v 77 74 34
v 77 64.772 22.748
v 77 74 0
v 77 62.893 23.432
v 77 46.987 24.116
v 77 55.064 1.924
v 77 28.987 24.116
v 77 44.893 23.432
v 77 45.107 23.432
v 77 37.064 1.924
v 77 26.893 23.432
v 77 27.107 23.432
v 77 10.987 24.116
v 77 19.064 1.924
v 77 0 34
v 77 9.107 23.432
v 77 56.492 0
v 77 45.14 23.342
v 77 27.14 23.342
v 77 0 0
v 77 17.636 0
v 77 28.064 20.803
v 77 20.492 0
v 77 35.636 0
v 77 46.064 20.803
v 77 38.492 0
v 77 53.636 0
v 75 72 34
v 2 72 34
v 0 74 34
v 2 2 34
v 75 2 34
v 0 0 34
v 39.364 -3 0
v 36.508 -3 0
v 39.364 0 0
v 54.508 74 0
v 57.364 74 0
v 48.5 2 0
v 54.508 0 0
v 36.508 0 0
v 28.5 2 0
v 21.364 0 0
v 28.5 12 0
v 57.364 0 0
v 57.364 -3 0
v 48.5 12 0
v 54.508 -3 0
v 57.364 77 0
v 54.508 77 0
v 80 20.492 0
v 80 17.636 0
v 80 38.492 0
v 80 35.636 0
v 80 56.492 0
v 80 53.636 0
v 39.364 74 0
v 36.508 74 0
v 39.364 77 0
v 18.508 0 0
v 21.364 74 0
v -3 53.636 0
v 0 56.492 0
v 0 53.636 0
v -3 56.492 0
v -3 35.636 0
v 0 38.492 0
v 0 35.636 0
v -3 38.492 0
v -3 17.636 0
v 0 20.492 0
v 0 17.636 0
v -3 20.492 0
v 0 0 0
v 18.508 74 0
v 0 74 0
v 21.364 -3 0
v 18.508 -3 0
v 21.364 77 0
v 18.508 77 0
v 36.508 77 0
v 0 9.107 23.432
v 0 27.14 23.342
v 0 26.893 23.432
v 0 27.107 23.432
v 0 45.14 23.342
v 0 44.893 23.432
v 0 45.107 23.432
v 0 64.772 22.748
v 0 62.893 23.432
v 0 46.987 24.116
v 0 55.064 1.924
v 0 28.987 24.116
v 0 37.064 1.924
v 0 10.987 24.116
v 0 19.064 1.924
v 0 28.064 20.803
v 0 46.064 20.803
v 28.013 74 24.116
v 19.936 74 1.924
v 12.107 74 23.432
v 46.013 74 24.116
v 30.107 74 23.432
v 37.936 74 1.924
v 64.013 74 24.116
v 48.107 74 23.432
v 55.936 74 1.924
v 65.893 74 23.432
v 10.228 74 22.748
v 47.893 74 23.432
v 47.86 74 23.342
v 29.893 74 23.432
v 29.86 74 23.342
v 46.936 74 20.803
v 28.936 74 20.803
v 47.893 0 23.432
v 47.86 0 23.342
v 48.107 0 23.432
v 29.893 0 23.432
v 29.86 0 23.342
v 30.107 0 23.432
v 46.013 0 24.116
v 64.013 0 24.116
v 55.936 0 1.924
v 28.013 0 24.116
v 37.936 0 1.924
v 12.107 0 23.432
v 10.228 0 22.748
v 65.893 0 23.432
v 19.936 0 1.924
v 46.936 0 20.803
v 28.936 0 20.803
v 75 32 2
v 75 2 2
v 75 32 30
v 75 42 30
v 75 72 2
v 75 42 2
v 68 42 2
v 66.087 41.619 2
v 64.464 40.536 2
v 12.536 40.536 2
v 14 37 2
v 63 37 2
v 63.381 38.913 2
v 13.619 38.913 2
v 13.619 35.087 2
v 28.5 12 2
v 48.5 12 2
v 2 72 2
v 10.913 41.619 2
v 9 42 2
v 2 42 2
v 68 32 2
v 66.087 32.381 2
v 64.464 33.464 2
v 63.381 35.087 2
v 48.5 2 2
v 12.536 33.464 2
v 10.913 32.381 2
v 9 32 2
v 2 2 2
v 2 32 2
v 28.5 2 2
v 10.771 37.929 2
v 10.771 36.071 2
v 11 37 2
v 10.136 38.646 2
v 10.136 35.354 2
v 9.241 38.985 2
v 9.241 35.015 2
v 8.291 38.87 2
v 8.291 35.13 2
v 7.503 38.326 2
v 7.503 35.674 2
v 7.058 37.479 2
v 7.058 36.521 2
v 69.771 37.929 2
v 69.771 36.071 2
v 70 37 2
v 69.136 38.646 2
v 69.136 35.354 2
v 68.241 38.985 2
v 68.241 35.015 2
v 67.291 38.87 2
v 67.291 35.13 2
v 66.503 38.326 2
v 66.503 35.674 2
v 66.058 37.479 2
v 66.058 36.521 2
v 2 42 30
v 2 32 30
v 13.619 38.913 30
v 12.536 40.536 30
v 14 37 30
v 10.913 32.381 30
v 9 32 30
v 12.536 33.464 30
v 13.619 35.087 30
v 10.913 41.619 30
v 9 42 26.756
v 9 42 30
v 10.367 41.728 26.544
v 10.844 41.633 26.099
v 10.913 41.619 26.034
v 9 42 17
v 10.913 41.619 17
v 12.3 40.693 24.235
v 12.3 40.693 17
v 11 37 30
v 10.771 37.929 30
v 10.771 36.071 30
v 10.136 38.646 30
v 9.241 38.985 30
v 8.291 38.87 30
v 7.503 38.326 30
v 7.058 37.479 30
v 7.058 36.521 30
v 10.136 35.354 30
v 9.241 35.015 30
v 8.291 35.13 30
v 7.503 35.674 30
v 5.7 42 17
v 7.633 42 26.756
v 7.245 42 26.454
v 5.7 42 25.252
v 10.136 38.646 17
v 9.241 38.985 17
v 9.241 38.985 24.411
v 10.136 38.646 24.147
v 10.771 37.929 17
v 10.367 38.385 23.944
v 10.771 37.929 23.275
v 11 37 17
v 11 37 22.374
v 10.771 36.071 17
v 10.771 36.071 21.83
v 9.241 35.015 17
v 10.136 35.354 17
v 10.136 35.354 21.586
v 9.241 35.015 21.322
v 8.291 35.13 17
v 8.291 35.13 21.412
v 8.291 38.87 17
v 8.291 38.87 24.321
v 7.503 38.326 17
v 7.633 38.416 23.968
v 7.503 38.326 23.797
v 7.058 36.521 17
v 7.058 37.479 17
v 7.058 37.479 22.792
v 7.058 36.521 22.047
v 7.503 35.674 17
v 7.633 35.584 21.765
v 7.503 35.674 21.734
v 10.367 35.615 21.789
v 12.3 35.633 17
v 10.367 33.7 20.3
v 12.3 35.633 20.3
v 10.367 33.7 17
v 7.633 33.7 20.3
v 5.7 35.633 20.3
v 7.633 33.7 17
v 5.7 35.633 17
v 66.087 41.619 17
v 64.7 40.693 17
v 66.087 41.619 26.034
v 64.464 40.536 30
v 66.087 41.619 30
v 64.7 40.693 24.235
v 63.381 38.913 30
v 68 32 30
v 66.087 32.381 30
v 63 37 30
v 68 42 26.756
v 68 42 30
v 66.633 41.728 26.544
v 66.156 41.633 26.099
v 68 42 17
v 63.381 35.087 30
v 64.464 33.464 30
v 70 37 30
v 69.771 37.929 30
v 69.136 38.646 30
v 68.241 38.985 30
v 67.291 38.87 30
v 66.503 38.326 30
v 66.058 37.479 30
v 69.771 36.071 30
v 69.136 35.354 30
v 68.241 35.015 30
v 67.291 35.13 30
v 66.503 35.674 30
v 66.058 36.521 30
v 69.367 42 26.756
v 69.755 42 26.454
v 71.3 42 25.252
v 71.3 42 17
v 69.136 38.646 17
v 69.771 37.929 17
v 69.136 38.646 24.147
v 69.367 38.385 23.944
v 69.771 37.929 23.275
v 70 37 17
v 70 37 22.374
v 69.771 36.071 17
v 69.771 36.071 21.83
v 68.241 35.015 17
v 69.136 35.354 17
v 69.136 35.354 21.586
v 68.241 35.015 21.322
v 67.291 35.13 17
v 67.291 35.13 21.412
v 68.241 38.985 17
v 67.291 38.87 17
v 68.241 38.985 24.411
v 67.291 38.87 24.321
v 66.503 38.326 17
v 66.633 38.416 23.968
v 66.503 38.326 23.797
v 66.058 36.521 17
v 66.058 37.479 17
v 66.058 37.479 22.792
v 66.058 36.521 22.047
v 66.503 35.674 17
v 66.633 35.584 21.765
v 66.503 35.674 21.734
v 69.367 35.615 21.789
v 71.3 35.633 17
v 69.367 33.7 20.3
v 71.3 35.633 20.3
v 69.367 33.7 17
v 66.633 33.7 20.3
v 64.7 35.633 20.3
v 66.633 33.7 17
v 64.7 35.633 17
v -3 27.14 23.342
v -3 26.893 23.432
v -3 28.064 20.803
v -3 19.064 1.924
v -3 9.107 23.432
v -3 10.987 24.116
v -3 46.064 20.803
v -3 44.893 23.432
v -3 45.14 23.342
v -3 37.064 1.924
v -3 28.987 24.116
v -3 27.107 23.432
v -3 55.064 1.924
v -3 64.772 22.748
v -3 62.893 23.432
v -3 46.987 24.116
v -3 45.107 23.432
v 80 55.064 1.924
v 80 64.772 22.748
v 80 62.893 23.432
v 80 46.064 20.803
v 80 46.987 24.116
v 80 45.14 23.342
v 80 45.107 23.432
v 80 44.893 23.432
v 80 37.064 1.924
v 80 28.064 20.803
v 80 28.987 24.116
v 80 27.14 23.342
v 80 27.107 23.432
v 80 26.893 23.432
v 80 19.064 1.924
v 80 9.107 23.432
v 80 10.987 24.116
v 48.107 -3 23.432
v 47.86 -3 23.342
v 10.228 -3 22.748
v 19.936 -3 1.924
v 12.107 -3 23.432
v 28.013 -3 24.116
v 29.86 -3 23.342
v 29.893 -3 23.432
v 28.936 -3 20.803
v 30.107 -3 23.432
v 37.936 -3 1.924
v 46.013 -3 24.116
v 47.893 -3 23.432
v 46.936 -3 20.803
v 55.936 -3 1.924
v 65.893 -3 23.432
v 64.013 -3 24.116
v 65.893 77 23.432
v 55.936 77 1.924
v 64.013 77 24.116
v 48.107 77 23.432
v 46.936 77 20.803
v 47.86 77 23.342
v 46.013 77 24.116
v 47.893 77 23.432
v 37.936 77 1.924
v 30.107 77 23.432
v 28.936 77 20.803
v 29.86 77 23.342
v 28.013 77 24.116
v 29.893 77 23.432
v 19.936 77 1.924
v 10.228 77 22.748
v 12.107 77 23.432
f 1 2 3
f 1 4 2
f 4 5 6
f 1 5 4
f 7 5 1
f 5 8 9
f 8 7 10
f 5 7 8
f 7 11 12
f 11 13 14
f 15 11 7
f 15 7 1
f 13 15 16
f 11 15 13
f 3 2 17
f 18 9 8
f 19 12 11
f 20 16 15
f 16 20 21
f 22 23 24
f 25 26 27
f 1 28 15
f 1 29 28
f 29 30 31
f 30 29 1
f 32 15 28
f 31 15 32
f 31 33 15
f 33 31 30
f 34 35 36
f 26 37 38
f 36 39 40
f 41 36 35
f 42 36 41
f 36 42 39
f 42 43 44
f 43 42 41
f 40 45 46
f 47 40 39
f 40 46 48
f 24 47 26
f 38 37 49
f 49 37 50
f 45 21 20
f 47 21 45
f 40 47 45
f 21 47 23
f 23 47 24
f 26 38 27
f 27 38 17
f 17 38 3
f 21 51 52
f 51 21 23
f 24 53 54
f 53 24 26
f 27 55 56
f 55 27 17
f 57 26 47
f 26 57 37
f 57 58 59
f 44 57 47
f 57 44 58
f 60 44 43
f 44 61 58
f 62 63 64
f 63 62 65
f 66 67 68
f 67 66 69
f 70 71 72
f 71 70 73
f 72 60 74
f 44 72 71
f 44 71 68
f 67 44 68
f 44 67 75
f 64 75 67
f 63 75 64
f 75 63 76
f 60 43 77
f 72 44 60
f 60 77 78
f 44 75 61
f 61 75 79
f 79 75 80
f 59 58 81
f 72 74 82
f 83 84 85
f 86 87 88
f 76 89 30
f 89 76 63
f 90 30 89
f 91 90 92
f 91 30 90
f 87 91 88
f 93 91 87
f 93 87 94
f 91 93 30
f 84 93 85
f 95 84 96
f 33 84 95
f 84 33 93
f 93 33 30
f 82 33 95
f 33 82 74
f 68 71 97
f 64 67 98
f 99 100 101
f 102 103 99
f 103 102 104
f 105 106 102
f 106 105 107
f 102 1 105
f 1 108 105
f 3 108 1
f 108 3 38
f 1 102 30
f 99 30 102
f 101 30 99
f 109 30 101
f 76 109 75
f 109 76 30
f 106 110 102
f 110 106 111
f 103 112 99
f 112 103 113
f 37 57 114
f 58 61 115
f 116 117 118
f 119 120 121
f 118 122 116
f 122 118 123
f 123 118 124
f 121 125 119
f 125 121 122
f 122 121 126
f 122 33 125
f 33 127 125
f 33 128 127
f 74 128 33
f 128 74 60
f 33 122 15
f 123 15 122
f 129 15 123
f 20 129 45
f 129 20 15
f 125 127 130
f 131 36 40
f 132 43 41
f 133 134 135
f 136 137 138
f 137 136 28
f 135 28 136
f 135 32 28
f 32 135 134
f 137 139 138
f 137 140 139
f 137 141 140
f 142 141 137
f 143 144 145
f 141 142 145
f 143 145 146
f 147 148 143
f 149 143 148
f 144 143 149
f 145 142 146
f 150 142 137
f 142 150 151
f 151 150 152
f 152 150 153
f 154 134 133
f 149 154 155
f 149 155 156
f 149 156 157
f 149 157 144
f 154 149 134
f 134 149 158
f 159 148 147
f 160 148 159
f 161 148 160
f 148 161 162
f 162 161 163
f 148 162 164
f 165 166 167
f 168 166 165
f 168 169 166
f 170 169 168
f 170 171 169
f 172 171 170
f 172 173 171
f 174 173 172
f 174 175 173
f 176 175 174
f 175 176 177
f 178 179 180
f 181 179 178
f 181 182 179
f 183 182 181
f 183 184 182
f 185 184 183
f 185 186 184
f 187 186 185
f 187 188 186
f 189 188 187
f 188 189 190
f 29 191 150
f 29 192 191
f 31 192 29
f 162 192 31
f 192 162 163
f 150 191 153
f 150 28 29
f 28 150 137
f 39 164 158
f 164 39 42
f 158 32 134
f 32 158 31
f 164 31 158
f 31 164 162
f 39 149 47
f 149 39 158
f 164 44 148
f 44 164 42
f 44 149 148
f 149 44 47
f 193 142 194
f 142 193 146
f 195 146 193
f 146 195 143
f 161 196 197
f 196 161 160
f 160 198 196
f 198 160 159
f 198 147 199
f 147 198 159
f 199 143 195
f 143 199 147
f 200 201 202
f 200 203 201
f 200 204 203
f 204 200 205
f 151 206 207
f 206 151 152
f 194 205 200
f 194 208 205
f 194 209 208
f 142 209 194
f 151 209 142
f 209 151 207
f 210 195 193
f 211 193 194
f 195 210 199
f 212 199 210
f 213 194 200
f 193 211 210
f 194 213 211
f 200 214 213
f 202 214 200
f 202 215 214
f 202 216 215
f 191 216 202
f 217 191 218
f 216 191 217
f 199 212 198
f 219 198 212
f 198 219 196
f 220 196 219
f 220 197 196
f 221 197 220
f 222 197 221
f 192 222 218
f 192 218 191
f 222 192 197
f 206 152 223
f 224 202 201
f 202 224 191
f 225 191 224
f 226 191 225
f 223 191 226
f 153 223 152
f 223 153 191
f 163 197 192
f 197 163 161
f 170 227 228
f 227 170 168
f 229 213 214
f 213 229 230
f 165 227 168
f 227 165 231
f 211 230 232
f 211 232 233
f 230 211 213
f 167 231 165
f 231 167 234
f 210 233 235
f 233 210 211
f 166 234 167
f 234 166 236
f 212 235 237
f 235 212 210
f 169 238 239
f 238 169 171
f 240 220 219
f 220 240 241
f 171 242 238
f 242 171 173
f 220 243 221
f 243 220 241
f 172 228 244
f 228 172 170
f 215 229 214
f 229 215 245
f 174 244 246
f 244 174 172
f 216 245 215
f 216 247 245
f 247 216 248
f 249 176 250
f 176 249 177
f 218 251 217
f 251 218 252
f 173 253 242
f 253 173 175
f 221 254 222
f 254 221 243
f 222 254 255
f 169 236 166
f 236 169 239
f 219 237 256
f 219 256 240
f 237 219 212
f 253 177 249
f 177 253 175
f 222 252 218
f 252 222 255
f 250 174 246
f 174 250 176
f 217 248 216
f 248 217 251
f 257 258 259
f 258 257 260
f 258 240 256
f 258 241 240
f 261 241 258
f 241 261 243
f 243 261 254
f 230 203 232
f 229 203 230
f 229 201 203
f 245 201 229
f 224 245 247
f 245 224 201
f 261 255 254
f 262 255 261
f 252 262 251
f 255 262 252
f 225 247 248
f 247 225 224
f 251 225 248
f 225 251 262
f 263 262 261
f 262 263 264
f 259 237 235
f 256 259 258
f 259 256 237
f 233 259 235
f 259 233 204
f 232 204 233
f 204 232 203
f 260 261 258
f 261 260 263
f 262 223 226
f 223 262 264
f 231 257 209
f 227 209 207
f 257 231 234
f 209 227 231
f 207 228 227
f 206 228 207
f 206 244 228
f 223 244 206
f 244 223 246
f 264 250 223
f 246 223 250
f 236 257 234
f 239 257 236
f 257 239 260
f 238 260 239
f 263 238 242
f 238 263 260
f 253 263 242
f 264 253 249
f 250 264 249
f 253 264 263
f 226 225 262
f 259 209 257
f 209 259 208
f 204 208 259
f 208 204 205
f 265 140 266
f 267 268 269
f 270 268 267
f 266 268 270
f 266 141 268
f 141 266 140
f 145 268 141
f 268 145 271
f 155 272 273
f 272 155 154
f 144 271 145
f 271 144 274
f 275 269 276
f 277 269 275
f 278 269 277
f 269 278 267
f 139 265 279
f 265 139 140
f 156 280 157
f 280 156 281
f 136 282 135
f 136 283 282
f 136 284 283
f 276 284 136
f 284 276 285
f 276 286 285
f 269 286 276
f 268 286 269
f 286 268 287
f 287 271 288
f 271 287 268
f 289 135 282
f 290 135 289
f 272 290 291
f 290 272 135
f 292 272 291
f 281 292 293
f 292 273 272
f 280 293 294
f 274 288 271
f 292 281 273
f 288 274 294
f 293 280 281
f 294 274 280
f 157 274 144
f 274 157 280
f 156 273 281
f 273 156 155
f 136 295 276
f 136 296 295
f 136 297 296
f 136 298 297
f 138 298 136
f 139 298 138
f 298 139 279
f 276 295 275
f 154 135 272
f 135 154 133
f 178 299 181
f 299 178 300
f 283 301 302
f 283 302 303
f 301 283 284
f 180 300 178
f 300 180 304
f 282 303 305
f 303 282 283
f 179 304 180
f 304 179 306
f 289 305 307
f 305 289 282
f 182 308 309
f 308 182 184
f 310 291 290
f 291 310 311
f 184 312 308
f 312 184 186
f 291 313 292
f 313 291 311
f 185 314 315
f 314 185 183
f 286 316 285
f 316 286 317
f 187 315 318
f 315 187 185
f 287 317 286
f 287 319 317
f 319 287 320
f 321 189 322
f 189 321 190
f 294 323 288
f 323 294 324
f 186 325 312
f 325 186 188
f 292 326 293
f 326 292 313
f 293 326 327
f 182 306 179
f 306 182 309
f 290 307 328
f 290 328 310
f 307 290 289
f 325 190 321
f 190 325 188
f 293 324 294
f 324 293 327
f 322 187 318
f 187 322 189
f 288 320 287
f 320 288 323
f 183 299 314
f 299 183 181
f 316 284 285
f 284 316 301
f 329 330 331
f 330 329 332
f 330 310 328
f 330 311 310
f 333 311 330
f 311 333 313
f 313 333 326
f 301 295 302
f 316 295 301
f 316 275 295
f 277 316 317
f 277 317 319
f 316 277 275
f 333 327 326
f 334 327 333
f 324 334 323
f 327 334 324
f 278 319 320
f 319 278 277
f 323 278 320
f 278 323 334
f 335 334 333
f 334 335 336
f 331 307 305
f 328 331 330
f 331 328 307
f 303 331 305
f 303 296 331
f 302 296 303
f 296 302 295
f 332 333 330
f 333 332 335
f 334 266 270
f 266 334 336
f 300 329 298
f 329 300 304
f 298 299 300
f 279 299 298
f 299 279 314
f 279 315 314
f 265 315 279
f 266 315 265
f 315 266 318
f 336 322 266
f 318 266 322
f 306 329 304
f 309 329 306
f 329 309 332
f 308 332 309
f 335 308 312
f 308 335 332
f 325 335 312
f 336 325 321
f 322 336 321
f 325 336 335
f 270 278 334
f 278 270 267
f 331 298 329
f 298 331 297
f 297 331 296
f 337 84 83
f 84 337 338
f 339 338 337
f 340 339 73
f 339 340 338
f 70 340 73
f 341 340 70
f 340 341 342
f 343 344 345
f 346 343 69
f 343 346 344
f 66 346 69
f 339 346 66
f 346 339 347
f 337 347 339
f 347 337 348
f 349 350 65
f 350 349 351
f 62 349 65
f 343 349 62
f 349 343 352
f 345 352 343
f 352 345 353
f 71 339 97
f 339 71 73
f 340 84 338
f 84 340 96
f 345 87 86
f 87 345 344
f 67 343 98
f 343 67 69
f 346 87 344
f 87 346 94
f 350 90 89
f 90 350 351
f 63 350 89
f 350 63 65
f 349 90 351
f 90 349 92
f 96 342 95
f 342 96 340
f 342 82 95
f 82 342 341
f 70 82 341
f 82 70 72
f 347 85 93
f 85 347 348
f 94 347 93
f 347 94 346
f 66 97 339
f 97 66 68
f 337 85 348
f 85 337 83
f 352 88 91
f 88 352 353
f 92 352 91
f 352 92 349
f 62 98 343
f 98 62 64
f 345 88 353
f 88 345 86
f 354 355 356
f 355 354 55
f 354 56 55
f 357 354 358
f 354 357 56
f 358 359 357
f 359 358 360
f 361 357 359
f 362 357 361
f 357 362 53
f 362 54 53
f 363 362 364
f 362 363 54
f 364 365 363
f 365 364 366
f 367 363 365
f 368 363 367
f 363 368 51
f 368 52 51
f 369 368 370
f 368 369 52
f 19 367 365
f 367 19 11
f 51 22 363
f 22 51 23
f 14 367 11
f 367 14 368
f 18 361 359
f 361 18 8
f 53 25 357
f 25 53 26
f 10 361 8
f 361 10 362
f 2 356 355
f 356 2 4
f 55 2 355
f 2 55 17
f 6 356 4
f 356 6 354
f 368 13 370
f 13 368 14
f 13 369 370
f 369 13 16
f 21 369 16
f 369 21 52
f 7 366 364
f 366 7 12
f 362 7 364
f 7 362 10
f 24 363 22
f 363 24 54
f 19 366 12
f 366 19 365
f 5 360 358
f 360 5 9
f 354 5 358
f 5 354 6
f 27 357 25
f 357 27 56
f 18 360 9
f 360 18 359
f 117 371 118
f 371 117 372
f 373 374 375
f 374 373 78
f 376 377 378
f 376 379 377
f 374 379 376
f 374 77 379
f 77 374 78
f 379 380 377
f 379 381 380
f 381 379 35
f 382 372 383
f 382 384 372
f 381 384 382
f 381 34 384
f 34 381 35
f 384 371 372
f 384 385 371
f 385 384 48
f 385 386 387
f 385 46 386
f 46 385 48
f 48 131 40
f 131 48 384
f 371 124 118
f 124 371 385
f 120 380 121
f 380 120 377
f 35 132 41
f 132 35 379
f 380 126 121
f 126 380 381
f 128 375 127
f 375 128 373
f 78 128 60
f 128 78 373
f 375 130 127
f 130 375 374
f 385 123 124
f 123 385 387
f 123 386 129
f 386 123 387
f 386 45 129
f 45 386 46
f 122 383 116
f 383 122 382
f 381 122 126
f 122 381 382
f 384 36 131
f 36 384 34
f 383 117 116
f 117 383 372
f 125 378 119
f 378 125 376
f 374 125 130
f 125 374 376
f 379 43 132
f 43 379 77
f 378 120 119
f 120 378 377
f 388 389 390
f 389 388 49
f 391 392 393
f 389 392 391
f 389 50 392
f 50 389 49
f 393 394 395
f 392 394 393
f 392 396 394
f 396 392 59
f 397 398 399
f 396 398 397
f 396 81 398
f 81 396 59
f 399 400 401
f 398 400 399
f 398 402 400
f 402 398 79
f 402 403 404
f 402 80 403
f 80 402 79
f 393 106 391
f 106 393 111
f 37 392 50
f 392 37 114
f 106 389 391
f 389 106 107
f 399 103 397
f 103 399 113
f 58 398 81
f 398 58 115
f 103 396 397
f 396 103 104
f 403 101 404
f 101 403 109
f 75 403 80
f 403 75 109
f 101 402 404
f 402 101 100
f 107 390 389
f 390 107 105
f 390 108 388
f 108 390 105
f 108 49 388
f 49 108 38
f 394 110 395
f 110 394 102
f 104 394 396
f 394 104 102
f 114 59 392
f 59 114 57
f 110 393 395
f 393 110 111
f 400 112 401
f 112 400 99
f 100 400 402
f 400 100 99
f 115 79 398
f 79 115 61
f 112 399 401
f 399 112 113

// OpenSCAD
// file: screw.scad
module screw()
{
  size = 6;
  height=3;
  translate([0, 0, height/2])
    intersection()
    {
      cube([size, size, height], center=true);
      rotate([0,0,45])
        cube([size, size, height], center=true);
    }
}

%screw();
// file: controller.scad
module controller()
{
  difference()
  {
    // body
    union()
    {
      difference()
      {
        union()
        {
          translate([0,0,24])
            cube([88, 86, 13]);
          translate([15, 10, 0])
            cube([59, 66, 24]);
        }
        translate([15+2, 10, 0])
          cube([55, 16, 25]);
      }
      // power cord mounts
      translate([(88-20)/2, 10+2, 24-10])
        cube([20, 8, 10]);
      // screw hole frame
      for(dx = [15, 88-15])
        translate([dx, 43, 24-3])
          hull()
          {
            for(dy = [0, 13-10.5])
              translate([0, dy, 0])
                cylinder(r=10.5/2, h=3);
          }
    }

    // screw mounts
    for(dx = [15, 88-15])
      translate([dx, 43, 0])
        hull()
        {
          for(dy = [0, 13-10.5])
            translate([0, dy, 0])
              cylinder(r=10.5/2, h=24-3);
        }

    // screw holes
    for(dx = [15, 88-15+3/2/2])
      translate([dx, 43, 24-3])
        hull()
        {
          for(dy = [0, 13-10.5])
            translate([0, dy, 0])
              cylinder(r=3/2, h=3, $fs=0.01);
        }
  }
}

%controller();
// file: junction_box.scad
use <controller.scad>
use <screw.scad>

module side_bruse_impl()
{
  for(sig = [-1, +1])
    for(i = [1, 2, 3])
      translate([0, i*18, -1])
        rotate([sig*20, 0, 0])
          cube([3, 2, 26]);
}

module junction_box_impl()
{
  wall = 2;
  extra_depth = 5;
  int_size = [73, 70, 24+3+extra_depth];

  difference()
  {
    // main box
    cube(int_size + [2,2,1]*wall);
    translate([1,1,1]*wall)
      cube(int_size);
    // place for cables
    cable_cut_in = [20, 10, wall];
    translate([(int_size[0]+2*wall-cable_cut_in[0])/2, wall, 0])
      cube(cable_cut_in);
  }

  // screw holes
  dist_from_center = 59/2;
  for(dx = [-1, +1])
  {
    translate([(int_size[0]+2*wall)/2+dx*dist_from_center,
               wall+int_size[1]/2,
               wall])
    {
      difference()
      {
        // main screw corridor
        union()
        {
          cylinder(r=10/2, h=int_size[2]-4);
          translate([((12/2+2)/2)*(dx-1), -10/2, 0])
            cube([12/2+2, 10, int_size[2]-4]);
        }
        cylinder(r=(3+1)/2, h=int_size[2]-2, $fs=1);
        // nut cut-in
        translate([0, 0, int_size[2]-4-13])
          scale(1.1)
            hull()
            {
              screw();
              translate([0, 9, 0])
                screw();
              translate([0, 9, 7])
                screw();
            }
      }
    }
  }

  // side bruses for better mounting - left/right
  for(dx = [-3, int_size[0]+2*wall])
    translate([dx, 0, 0])
      side_bruse_impl();
  // side bruses for better mounting - up/down
  for(dy = [-3, int_size[1]+2*wall])
    translate([75, dy, 0])
      rotate([0, 0, 90])
        side_bruse_impl();
}

module junction_box()
{
  difference()
  {
    junction_box_impl();
    translate([-10, -10, -5])
      cube([100,100,5]);
  }
}

if(false)
  translate([-7, -6, 10*2])
    controller();

junction_box();
// main file
use <junction_box.scad>;

for(i = [0:0])
  translate(i*[0, 83, 0])
    junction_box();
